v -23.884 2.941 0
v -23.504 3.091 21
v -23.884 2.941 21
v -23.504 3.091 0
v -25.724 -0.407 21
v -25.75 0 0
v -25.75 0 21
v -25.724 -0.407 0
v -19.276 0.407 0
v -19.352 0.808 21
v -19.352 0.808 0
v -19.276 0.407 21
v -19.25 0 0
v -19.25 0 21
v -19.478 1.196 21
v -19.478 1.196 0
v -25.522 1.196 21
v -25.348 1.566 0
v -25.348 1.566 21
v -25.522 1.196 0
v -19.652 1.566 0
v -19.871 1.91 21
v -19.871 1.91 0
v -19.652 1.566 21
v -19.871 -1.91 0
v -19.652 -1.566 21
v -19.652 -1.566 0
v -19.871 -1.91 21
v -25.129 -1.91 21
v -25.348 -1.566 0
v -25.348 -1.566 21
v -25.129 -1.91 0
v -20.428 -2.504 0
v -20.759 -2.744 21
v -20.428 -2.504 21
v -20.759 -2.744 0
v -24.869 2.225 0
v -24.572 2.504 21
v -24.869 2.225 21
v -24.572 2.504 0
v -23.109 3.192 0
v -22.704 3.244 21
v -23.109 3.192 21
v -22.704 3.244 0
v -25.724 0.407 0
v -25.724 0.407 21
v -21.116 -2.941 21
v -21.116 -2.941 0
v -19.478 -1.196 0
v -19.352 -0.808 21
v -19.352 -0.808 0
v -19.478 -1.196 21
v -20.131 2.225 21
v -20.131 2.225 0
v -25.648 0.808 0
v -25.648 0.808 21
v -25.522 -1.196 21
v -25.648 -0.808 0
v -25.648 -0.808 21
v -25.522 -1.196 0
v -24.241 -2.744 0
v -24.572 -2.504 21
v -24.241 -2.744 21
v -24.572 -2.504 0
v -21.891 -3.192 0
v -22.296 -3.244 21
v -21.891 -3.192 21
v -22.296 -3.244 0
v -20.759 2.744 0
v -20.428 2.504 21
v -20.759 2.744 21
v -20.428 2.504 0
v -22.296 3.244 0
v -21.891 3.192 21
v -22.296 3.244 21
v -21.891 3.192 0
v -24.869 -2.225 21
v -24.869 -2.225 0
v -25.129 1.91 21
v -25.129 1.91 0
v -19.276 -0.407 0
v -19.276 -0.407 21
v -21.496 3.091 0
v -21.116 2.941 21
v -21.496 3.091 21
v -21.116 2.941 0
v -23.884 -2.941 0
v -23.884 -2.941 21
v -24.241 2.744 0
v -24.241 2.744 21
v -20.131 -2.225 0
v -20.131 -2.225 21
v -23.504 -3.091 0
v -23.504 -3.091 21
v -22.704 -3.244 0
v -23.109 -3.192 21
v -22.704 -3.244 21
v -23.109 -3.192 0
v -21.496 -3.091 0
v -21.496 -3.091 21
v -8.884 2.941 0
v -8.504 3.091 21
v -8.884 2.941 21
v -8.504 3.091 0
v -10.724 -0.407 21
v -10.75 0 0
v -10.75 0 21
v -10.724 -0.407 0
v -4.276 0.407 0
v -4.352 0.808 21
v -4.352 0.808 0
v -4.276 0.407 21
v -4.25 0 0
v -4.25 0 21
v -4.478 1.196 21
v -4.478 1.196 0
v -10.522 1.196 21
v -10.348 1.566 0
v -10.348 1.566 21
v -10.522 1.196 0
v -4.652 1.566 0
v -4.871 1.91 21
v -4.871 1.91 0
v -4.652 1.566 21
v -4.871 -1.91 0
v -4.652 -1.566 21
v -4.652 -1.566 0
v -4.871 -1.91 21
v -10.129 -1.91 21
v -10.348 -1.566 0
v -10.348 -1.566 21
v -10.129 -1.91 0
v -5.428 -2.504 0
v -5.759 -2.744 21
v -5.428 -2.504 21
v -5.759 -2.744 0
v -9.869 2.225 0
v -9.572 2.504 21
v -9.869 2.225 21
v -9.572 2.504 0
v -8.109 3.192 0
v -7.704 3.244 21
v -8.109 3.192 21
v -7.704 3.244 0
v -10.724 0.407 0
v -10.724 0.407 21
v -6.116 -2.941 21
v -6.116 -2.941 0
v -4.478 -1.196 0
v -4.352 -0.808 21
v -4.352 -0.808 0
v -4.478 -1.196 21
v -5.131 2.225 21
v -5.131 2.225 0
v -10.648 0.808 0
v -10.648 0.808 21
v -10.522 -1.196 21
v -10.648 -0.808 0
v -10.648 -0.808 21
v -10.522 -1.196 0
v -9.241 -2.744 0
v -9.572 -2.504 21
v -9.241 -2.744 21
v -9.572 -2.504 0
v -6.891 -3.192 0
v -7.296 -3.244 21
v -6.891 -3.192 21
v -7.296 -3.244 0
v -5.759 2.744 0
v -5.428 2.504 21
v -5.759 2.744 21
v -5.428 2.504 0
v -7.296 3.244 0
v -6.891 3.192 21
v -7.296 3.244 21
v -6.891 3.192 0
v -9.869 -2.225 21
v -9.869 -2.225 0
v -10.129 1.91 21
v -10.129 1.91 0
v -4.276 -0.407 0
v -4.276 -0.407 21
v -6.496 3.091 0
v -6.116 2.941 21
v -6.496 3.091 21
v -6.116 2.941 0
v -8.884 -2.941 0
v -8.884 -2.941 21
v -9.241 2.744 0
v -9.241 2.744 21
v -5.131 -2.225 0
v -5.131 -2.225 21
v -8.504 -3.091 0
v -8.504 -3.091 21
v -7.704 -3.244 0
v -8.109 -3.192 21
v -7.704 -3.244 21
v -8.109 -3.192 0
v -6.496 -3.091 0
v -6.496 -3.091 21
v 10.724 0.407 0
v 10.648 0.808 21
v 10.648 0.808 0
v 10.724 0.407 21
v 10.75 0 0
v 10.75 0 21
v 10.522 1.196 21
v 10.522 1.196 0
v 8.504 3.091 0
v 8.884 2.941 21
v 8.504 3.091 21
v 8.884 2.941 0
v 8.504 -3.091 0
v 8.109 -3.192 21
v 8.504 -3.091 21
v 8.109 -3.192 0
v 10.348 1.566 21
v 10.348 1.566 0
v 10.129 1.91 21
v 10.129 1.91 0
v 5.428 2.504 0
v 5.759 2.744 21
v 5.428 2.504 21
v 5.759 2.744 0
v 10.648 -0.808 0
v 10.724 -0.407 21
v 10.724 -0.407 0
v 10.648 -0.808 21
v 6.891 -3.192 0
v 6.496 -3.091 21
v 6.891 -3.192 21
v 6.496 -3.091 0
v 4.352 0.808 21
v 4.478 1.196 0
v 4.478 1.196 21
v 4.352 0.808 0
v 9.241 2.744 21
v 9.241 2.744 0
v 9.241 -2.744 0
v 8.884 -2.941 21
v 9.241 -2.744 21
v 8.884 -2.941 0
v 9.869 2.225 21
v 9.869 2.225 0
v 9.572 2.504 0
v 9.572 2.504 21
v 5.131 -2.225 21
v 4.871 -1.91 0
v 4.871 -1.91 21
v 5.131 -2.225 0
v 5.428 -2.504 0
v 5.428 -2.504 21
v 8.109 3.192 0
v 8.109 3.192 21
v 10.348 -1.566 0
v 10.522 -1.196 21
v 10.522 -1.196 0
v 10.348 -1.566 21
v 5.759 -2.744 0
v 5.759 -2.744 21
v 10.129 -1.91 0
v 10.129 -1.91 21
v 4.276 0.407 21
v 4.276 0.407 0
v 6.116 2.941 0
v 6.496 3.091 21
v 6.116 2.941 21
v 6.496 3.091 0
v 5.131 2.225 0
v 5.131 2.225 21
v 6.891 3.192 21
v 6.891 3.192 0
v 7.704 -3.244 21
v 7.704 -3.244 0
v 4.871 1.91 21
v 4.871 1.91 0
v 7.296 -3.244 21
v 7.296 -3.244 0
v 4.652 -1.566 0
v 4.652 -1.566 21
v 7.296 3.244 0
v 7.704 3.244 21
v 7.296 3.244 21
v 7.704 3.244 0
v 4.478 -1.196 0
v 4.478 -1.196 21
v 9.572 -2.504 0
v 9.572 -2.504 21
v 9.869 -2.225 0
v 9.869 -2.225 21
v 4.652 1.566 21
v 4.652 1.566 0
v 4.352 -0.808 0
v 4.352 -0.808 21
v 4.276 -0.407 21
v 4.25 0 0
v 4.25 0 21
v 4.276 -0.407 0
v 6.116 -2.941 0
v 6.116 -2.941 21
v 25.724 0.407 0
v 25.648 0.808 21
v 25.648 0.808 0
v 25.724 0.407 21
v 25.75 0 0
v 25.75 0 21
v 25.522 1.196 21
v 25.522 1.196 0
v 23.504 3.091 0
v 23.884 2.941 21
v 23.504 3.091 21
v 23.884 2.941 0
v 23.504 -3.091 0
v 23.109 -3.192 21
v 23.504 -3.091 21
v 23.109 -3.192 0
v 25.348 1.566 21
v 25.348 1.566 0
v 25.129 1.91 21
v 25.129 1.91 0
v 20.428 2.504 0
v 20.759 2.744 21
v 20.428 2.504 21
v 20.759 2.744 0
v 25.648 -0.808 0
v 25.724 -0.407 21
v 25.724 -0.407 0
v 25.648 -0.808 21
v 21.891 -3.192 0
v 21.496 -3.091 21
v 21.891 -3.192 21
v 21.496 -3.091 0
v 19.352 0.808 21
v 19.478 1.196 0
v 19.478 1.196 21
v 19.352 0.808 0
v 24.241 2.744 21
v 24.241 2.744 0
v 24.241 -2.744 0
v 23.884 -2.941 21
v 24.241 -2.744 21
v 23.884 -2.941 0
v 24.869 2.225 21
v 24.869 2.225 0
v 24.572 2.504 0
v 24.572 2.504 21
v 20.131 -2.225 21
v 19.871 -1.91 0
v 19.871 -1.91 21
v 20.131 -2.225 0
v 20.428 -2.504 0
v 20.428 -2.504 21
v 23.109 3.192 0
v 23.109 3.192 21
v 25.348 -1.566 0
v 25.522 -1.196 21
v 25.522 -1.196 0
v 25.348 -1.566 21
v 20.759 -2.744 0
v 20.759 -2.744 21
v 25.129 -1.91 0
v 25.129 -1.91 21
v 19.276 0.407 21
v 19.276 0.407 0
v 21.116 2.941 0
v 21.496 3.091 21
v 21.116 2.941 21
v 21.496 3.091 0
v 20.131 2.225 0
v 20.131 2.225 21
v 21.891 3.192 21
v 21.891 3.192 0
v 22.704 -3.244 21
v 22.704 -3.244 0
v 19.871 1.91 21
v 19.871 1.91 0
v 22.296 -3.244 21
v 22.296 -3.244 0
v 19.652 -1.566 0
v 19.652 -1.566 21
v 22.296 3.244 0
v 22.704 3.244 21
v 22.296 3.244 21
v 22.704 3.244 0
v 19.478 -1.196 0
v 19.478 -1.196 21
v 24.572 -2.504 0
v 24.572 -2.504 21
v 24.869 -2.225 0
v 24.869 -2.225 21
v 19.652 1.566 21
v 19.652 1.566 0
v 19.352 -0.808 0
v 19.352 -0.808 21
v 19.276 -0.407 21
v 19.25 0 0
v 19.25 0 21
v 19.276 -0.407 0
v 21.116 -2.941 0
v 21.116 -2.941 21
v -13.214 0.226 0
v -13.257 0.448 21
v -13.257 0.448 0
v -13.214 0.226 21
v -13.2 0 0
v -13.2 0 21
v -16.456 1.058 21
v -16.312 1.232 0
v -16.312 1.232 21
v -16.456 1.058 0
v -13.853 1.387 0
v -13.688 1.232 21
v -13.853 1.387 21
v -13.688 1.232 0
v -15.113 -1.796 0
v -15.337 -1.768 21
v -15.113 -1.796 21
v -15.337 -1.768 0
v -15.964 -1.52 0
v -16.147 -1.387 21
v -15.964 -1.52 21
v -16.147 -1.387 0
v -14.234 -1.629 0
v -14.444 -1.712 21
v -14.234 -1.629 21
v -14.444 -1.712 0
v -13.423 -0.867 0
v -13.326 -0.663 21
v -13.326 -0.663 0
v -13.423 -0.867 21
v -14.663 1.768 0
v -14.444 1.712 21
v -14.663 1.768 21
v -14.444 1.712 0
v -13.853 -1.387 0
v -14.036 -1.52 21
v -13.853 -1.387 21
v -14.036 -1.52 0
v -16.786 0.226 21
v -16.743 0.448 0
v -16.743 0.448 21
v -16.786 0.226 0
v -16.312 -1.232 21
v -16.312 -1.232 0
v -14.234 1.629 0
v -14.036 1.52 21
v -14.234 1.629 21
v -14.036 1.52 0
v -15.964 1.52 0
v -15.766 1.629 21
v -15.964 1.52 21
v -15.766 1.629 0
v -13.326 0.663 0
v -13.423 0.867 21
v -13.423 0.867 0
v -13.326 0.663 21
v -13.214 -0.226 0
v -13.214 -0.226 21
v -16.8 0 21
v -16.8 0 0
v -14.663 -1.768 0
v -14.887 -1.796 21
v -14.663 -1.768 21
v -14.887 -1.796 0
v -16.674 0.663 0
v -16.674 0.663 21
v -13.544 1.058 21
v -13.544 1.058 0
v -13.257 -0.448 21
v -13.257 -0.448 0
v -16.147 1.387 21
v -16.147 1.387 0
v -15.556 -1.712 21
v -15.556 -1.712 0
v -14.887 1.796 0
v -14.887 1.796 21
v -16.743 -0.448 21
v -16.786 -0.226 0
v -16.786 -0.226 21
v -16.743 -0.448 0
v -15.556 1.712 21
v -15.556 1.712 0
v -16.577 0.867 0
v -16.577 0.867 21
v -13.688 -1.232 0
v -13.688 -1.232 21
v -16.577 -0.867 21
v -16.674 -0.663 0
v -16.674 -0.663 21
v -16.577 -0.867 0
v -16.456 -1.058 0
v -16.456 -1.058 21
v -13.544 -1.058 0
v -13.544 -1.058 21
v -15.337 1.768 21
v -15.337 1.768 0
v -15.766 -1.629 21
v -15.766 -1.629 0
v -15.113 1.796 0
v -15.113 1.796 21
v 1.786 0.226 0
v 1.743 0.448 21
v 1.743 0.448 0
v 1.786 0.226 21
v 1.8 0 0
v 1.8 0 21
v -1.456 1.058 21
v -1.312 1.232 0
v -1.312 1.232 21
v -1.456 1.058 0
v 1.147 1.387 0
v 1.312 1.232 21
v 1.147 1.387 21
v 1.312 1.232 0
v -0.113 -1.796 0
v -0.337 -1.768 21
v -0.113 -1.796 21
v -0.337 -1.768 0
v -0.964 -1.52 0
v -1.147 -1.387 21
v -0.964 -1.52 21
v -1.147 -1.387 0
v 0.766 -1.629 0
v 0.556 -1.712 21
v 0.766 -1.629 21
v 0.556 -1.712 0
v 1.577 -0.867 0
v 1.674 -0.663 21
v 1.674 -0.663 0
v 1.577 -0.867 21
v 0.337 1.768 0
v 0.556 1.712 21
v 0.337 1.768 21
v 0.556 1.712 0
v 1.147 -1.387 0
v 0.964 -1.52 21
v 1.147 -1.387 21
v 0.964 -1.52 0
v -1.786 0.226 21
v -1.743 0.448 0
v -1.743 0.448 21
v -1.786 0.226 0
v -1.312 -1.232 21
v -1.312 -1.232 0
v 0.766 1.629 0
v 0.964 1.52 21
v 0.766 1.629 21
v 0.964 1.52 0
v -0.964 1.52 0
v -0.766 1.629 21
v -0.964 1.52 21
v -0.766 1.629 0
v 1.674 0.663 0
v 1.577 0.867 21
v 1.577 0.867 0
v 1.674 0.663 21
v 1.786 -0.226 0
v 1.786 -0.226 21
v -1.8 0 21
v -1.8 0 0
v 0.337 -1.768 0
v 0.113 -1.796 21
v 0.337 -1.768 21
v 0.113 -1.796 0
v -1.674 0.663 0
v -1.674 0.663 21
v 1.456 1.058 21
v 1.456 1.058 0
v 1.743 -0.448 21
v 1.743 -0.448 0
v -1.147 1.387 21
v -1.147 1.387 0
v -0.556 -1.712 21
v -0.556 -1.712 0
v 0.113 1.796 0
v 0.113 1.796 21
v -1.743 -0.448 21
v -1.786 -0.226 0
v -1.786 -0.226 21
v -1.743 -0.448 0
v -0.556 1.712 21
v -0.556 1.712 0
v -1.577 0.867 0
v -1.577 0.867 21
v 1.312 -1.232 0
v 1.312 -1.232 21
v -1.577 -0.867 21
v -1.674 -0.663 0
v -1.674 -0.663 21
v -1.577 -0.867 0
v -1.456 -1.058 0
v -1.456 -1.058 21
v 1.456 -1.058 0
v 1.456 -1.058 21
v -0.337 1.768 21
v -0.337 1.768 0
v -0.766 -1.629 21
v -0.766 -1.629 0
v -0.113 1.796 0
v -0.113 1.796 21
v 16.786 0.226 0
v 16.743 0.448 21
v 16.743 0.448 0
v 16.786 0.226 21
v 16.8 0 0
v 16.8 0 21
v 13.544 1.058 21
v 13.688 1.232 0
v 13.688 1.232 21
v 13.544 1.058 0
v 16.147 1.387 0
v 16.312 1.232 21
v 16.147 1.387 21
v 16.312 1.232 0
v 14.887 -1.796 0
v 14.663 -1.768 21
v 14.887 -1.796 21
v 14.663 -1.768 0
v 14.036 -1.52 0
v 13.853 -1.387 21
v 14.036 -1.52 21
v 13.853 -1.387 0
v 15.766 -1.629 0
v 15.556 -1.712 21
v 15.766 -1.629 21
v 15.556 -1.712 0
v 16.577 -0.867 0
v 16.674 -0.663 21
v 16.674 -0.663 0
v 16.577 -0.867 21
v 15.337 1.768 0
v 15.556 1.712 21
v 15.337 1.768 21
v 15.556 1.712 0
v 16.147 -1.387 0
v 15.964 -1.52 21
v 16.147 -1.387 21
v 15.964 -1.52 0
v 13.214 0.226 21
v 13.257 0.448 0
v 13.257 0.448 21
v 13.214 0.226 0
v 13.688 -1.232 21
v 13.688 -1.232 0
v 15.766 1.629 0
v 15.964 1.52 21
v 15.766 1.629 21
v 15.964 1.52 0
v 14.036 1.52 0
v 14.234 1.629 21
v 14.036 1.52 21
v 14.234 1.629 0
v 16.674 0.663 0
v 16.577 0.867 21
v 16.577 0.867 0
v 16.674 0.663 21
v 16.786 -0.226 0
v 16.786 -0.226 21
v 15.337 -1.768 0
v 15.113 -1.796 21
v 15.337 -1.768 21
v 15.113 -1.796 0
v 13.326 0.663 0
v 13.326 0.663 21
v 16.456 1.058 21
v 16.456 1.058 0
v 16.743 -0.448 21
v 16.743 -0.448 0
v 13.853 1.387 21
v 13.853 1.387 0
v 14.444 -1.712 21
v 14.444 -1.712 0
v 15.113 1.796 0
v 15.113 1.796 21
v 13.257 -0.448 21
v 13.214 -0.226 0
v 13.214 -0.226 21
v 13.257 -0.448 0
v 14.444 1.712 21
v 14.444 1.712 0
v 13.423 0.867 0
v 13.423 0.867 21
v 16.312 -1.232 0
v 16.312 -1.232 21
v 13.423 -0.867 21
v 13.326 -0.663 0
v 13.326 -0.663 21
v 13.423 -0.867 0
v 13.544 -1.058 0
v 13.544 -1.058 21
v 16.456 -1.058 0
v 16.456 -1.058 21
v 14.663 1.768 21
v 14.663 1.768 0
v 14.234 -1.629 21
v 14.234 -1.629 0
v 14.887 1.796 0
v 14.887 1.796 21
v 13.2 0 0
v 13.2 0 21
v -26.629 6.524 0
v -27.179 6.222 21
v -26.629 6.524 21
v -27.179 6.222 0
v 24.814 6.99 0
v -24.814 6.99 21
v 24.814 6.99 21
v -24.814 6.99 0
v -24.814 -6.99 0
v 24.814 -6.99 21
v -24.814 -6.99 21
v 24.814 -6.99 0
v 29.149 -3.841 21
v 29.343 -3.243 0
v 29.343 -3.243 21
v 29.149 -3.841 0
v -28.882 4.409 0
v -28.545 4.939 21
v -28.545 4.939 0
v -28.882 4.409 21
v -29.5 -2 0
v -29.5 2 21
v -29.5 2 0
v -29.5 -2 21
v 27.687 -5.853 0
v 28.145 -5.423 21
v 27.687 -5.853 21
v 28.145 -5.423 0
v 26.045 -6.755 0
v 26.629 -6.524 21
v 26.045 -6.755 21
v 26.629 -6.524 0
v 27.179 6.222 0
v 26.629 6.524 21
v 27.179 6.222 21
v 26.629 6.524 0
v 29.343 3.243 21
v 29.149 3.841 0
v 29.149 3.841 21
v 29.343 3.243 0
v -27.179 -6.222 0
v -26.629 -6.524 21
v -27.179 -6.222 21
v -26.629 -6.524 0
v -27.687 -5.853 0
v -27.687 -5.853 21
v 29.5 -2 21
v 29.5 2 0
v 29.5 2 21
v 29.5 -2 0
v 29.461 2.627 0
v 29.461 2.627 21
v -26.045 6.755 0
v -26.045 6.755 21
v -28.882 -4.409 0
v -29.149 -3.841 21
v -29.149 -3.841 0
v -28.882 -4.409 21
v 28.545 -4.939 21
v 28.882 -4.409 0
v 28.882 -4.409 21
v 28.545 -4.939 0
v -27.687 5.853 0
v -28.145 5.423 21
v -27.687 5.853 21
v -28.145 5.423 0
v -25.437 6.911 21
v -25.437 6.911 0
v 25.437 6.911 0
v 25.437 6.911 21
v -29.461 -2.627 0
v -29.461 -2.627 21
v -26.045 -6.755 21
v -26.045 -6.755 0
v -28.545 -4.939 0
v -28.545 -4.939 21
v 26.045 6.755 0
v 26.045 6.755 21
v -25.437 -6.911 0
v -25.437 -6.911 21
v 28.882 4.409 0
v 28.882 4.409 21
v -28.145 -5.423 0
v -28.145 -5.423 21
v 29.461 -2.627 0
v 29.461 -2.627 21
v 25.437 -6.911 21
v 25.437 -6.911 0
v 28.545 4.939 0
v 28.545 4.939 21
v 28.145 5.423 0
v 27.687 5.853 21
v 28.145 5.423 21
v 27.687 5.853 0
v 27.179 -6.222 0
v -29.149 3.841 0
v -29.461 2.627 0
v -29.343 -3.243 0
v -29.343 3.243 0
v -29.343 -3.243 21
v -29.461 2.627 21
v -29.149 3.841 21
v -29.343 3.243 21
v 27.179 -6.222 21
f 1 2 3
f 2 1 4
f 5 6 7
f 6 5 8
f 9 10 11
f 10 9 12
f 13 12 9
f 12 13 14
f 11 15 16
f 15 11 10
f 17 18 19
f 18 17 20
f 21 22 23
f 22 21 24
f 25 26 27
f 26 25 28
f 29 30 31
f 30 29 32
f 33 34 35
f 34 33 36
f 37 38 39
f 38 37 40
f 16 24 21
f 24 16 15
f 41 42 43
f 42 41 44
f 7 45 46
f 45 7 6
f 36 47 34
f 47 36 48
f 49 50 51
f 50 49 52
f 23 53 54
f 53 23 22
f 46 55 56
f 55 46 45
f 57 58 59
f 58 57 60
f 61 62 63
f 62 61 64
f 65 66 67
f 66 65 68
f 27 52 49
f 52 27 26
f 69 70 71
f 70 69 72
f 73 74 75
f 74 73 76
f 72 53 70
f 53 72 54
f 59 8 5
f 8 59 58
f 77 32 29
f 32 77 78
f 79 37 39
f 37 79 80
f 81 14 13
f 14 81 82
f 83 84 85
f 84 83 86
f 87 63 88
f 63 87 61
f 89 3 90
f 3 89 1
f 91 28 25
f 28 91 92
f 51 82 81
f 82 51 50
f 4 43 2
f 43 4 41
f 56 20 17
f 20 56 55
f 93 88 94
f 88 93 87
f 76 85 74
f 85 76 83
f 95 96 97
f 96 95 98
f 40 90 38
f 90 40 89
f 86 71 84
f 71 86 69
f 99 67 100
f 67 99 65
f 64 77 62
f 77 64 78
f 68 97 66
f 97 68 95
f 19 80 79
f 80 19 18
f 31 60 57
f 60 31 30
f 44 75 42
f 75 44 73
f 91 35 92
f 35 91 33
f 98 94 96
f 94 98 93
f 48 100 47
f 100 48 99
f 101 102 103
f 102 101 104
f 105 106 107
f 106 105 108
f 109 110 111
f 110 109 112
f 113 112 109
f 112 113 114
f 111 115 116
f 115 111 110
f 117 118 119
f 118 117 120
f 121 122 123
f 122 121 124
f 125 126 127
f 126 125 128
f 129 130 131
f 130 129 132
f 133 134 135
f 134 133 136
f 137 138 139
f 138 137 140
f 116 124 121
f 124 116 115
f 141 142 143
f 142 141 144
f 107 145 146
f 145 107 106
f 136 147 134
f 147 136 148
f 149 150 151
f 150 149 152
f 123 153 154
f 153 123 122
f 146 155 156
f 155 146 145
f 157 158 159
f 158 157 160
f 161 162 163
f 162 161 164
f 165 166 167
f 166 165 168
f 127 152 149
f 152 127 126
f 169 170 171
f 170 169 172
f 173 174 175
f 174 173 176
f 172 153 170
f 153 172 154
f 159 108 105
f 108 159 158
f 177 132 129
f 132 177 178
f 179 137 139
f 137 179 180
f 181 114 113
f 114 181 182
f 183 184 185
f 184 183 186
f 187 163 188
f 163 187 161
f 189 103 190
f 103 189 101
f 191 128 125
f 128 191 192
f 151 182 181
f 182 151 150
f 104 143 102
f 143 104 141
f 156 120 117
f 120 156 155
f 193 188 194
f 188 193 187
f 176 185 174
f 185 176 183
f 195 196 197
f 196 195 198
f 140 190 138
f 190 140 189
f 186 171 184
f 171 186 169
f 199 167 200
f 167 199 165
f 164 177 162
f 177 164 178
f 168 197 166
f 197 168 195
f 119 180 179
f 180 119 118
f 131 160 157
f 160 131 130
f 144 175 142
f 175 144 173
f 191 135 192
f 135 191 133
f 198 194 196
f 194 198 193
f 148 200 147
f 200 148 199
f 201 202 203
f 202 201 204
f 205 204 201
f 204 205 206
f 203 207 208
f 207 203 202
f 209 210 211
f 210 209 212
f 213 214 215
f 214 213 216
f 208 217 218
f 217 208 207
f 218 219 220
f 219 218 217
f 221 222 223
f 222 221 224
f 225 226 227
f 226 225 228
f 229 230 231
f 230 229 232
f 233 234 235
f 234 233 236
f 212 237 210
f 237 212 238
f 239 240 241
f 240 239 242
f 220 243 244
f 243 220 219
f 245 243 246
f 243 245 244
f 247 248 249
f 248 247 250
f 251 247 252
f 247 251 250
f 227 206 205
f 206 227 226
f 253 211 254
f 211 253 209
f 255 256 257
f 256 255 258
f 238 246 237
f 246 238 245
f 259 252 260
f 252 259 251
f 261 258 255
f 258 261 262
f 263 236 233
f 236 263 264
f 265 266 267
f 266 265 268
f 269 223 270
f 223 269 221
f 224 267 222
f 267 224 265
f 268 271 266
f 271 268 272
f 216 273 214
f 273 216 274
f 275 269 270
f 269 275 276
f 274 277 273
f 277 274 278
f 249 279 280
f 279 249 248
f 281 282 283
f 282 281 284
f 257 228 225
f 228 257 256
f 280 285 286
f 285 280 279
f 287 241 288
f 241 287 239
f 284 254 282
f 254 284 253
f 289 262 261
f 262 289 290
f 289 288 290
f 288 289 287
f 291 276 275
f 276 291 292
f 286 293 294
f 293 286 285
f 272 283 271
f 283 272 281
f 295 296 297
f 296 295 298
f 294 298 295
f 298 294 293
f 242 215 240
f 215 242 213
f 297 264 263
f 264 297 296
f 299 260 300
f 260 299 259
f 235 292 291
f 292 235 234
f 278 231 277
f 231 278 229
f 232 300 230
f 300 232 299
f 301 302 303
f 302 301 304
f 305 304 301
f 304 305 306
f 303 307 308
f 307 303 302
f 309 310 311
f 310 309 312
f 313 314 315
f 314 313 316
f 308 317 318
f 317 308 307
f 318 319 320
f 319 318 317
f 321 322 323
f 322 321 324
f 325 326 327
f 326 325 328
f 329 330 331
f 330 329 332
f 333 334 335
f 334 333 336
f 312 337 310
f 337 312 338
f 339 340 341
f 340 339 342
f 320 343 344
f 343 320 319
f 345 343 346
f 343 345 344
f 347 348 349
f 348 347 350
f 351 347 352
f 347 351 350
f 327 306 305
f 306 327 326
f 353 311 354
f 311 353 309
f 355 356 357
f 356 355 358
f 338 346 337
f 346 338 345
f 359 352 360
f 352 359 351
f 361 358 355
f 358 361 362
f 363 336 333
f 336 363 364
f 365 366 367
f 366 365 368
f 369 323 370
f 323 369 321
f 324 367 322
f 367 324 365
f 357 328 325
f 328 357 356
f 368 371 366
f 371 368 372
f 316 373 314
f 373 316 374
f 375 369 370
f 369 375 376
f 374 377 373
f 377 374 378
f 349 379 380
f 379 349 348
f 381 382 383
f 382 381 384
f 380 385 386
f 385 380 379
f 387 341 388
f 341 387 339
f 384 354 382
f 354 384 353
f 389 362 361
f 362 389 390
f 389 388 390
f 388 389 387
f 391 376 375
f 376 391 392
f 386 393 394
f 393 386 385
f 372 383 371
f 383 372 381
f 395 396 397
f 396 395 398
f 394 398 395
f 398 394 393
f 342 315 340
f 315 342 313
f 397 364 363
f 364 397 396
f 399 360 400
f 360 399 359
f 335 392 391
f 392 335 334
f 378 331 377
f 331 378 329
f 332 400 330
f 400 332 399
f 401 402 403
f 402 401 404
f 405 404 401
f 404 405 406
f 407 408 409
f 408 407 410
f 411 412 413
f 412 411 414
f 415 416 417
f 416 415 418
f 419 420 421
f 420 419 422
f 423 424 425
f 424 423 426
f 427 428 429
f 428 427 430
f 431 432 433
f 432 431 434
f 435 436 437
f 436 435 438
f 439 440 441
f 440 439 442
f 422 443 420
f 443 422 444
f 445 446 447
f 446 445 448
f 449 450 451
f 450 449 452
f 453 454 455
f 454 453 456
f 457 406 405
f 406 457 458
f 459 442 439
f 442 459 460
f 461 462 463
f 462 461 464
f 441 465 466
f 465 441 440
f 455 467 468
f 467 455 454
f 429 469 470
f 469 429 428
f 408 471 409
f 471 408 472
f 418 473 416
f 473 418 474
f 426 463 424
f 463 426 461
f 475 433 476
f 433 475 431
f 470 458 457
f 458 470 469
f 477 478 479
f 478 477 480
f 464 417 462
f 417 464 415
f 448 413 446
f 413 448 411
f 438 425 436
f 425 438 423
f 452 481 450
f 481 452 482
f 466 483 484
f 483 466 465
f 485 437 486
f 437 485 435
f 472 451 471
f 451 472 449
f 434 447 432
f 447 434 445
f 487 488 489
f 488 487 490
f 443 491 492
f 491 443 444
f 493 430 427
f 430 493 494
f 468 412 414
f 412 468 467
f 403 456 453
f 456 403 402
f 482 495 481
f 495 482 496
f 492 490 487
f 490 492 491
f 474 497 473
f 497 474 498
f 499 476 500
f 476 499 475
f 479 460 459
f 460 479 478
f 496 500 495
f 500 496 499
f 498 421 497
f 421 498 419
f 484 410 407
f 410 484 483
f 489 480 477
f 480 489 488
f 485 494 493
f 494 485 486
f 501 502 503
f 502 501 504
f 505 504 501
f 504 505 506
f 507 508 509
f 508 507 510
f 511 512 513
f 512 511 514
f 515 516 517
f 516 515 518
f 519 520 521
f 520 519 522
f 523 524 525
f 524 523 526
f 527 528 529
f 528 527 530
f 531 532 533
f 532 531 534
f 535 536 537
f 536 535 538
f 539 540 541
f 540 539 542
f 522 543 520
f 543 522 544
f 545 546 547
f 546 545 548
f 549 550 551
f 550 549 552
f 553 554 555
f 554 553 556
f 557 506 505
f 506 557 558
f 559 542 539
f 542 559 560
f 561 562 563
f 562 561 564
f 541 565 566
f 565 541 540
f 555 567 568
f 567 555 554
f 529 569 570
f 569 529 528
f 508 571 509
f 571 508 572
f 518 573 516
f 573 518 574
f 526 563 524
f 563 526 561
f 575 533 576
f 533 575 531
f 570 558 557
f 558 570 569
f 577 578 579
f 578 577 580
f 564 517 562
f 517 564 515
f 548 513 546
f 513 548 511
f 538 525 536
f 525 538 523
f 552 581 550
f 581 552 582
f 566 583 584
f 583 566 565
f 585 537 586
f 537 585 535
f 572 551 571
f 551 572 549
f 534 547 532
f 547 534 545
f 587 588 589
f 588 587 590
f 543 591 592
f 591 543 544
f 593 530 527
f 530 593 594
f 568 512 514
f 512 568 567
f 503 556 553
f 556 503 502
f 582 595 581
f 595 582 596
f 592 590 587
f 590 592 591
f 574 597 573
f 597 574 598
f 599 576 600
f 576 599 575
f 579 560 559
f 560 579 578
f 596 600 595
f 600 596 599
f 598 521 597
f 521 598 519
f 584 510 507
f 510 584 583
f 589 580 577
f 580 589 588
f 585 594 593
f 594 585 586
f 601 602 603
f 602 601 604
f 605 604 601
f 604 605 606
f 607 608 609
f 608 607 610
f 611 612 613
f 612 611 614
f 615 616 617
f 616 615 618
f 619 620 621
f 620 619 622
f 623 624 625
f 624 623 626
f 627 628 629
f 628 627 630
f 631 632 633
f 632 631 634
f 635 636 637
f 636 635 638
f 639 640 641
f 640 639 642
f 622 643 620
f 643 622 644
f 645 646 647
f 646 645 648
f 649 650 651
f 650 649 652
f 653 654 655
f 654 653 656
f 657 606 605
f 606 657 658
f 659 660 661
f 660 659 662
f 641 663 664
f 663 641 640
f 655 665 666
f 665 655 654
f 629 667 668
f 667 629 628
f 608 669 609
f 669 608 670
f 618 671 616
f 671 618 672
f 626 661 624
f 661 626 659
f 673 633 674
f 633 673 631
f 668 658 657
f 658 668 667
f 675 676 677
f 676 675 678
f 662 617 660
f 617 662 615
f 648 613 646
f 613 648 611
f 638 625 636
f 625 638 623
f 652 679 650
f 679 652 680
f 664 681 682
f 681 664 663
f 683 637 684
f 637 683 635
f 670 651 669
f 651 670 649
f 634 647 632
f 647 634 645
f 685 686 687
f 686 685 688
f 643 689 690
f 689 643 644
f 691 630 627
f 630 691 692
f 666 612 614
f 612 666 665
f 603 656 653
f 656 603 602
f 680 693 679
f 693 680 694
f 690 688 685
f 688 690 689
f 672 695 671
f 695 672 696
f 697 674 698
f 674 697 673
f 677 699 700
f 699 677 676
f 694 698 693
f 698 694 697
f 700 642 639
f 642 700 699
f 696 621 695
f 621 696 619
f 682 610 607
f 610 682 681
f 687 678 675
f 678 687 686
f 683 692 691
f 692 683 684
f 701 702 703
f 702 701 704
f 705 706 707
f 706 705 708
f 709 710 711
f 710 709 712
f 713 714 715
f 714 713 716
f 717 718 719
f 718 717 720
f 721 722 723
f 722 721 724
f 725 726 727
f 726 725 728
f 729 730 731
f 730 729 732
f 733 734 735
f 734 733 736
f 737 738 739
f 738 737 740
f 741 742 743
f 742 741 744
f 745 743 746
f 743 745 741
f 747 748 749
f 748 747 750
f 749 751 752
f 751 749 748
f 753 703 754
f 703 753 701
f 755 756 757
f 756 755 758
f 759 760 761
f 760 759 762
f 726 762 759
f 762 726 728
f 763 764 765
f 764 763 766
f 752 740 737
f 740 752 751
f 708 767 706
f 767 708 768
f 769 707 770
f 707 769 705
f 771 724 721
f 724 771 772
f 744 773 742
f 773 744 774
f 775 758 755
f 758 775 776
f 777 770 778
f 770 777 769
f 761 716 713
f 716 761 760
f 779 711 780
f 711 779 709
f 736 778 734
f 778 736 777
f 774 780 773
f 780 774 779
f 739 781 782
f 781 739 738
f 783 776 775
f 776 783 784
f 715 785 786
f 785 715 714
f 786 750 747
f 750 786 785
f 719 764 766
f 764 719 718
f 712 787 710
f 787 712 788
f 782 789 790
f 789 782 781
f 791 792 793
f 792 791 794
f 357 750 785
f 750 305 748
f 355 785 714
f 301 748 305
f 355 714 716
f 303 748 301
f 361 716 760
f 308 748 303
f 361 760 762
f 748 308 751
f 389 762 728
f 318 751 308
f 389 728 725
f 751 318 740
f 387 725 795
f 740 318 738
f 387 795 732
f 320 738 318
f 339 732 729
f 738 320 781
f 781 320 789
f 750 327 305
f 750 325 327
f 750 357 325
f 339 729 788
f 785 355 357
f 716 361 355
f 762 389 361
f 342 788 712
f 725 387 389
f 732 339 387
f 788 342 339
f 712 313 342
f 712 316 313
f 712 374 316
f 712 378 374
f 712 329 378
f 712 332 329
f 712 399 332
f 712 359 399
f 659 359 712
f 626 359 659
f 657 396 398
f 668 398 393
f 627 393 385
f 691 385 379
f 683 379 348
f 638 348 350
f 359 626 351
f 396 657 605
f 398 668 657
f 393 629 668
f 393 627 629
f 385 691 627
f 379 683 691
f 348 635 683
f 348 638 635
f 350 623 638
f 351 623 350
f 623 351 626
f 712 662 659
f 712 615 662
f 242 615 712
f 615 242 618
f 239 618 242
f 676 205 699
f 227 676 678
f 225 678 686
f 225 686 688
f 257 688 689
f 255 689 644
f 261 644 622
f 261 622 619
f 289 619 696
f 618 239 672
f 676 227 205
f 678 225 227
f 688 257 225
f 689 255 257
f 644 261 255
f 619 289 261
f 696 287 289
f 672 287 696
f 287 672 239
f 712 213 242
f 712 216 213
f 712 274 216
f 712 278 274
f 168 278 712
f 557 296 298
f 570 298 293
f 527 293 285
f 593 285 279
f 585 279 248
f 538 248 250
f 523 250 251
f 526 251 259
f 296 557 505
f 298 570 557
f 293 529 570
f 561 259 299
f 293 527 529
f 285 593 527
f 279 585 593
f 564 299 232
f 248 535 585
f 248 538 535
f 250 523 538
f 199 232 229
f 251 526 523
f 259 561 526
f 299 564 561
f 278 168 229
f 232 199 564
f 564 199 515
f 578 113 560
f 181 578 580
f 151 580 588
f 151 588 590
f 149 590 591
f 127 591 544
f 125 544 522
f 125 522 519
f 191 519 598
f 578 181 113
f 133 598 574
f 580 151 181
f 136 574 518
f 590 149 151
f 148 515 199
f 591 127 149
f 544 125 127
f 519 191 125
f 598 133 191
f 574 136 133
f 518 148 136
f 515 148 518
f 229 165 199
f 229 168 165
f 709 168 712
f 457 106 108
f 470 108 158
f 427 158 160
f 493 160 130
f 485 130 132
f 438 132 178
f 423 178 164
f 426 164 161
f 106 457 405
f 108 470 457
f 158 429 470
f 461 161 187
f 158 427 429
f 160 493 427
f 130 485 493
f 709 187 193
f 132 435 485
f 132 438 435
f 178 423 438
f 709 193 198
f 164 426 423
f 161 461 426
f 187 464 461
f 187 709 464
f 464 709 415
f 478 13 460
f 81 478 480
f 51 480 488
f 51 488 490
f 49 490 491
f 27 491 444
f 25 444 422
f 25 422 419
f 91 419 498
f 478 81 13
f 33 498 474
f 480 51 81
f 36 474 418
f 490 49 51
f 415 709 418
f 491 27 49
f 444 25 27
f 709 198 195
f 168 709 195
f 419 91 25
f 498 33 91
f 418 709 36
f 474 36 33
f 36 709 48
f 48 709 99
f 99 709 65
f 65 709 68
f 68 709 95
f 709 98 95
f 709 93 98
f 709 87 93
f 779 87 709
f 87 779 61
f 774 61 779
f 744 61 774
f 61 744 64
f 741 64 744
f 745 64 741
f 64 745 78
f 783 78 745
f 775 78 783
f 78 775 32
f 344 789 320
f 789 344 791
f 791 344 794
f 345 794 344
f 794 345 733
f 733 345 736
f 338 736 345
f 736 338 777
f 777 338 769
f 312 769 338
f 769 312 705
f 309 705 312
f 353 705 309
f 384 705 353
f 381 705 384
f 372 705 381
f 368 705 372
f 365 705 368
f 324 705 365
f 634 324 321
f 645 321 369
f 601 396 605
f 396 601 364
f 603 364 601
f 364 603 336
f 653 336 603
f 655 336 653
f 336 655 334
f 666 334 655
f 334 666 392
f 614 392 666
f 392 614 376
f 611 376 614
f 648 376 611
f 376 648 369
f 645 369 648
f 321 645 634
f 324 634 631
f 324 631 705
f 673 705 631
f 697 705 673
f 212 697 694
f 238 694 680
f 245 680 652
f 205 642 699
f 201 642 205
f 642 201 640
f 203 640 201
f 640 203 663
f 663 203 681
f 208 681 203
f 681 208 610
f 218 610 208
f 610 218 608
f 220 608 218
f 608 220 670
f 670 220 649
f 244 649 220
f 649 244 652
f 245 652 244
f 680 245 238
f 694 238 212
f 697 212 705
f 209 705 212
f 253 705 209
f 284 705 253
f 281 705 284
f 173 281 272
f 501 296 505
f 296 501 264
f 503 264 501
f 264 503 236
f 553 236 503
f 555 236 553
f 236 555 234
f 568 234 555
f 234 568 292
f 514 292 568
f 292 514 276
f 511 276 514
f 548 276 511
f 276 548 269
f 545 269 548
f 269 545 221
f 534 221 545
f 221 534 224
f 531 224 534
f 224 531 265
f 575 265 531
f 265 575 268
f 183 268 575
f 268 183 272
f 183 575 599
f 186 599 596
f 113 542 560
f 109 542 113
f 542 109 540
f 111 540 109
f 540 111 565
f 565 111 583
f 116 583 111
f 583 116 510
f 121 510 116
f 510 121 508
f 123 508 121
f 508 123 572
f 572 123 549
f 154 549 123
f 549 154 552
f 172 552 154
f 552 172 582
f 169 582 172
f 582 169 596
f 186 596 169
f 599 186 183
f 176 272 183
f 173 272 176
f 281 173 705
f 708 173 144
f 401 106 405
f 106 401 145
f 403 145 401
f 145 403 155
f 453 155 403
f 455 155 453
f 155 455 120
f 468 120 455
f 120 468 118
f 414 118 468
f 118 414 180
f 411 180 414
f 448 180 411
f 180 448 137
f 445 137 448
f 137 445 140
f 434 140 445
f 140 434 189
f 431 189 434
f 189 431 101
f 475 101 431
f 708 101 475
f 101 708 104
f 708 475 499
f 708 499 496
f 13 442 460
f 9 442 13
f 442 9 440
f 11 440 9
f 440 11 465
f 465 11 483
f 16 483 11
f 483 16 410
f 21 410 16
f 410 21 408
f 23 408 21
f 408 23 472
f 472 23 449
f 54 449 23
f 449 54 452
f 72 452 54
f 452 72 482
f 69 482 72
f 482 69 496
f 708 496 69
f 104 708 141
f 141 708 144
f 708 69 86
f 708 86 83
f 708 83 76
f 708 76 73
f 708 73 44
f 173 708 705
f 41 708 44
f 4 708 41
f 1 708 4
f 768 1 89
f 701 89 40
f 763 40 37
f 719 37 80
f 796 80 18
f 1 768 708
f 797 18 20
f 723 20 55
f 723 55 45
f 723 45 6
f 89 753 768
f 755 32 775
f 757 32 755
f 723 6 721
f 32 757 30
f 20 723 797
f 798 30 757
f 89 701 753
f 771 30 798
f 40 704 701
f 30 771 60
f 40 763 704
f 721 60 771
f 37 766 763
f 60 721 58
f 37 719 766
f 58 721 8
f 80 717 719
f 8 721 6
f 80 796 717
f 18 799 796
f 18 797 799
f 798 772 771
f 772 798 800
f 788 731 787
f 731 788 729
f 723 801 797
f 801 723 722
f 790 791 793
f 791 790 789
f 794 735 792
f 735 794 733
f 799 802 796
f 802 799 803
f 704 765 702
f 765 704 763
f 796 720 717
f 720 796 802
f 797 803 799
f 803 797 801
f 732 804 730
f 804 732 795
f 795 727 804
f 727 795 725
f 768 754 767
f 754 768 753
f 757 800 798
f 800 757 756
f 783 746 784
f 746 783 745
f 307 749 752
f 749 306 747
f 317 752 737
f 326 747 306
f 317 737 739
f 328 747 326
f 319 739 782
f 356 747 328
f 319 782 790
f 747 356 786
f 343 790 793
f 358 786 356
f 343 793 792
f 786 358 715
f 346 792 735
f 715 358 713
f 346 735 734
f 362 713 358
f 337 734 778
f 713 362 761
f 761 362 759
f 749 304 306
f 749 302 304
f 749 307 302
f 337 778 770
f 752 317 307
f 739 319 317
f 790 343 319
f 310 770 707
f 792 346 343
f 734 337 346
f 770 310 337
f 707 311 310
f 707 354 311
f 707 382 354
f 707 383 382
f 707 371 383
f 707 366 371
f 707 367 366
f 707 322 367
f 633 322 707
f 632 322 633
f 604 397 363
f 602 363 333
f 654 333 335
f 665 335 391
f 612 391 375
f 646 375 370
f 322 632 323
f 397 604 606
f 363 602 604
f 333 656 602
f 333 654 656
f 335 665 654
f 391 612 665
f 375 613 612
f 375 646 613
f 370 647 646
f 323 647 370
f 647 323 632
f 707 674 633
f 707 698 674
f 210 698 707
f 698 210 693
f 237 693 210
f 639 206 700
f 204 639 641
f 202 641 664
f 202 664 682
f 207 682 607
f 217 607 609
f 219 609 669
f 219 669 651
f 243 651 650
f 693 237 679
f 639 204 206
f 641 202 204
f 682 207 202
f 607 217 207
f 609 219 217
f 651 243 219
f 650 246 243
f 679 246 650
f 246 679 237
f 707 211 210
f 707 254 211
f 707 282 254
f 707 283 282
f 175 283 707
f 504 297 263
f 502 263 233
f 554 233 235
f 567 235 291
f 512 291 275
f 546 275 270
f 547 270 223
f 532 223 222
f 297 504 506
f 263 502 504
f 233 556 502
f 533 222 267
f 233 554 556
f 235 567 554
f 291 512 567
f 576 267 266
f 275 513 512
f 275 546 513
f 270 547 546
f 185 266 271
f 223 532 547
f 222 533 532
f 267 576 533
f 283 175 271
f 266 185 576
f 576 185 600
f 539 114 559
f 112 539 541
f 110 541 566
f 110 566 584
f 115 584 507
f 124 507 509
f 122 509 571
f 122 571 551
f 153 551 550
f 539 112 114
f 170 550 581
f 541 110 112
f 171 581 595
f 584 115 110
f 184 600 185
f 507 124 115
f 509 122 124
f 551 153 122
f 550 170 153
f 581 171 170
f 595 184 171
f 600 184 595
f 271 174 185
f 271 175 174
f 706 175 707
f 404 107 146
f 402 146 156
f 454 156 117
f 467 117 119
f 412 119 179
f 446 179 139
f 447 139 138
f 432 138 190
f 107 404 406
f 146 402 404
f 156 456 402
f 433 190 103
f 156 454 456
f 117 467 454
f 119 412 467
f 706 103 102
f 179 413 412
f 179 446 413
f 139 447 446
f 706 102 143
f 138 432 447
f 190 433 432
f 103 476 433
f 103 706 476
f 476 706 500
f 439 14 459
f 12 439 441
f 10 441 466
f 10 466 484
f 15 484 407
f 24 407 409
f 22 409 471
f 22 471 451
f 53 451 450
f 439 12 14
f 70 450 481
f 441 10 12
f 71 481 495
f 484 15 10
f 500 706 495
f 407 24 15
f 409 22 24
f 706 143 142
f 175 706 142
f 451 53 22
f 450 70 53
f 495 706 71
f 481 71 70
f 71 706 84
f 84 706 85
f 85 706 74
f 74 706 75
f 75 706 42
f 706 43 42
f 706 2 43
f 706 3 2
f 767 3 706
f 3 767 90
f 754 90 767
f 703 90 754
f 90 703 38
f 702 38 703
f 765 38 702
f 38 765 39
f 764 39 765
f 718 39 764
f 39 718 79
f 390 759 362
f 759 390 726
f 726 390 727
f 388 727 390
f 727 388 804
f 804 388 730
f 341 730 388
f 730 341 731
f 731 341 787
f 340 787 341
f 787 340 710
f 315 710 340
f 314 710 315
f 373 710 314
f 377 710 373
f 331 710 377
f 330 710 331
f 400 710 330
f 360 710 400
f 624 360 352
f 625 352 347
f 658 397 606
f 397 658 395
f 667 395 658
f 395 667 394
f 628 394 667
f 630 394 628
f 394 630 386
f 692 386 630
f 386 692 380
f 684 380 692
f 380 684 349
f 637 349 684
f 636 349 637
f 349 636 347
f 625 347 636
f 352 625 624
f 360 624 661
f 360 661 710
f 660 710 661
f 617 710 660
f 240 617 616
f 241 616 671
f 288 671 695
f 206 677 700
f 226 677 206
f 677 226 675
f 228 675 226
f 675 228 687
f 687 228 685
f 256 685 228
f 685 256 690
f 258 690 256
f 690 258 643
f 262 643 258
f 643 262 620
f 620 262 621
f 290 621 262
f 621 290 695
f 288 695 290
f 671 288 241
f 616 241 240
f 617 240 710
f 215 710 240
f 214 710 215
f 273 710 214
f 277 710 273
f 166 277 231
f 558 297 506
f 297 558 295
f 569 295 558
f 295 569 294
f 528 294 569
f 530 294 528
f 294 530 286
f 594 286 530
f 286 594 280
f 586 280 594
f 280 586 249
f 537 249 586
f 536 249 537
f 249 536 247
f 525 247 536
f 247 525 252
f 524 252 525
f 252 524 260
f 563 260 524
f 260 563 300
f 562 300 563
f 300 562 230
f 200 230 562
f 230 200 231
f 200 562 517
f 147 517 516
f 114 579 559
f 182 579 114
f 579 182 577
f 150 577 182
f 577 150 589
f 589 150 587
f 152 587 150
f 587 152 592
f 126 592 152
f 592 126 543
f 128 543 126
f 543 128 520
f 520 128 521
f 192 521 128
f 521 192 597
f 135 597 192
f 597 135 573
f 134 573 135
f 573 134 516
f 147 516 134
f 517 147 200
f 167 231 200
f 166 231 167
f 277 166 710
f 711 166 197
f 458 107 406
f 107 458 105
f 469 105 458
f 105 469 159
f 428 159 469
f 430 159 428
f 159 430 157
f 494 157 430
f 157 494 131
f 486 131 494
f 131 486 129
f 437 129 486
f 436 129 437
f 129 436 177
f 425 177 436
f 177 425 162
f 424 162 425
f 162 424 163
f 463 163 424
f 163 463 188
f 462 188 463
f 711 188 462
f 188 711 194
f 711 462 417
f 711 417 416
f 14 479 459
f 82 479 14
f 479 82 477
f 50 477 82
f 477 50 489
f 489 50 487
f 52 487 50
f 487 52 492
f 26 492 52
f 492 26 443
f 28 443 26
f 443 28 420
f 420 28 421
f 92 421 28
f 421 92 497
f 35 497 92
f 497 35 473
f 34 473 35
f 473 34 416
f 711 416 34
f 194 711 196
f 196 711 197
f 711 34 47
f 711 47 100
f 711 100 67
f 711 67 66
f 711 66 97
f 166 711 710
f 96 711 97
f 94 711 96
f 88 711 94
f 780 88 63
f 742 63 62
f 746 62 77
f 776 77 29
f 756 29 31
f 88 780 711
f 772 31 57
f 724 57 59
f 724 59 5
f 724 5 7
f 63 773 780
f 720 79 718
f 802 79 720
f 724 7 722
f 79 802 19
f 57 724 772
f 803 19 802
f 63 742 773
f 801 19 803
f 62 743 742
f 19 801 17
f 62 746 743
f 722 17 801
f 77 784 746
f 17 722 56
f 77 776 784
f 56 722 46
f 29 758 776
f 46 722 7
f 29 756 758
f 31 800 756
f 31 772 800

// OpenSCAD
$fn = 50;


difference() {
	union() {
		*color(alpha = 1.0000000000, c = "gray") {
			translate(v = [0, 7, 0]) {
				linear_extrude(height = 1) {
					text(font = "Arial:style=Bold", halign = "center", size = 4.5000000000, text = "COMMENT plate main", valign = "center");
				}
			}
		}
		hull() {
			translate(v = [-24.5000000000, 2.0000000000, 0]) {
				cylinder(h = 21, r = 5);
			}
			translate(v = [24.5000000000, 2.0000000000, 0]) {
				cylinder(h = 21, r = 5);
			}
			translate(v = [-24.5000000000, -2.0000000000, 0]) {
				cylinder(h = 21, r = 5);
			}
			translate(v = [24.5000000000, -2.0000000000, 0]) {
				cylinder(h = 21, r = 5);
			}
		}
	}
	union() {
		*color(alpha = 1.0000000000, c = "gray") {
			translate(v = [0, 7, 0]) {
				linear_extrude(height = 1) {
					text(font = "Arial:style=Bold", halign = "center", size = 4.5000000000, text = "COMMENT holes main", valign = "center");
				}
			}
		}
		translate(v = [-22.5000000000, 0.0000000000, 0]) {
			translate(v = [0, 0, -100]) {
				cylinder(h = 200, r = 3.2500000000);
			}
		}
		translate(v = [-7.5000000000, 0.0000000000, 0]) {
			translate(v = [0, 0, -100]) {
				cylinder(h = 200, r = 3.2500000000);
			}
		}
		translate(v = [7.5000000000, 0.0000000000, 0]) {
			translate(v = [0, 0, -100]) {
				cylinder(h = 200, r = 3.2500000000);
			}
		}
		translate(v = [22.5000000000, 0.0000000000, 0]) {
			translate(v = [0, 0, -100]) {
				cylinder(h = 200, r = 3.2500000000);
			}
		}
		translate(v = [-22.5000000000, 0.0000000000, 0]) {
			translate(v = [0, 0, -100]) {
				cylinder(h = 200, r = 1.8000000000);
			}
		}
		translate(v = [-15.0000000000, 0.0000000000, 0]) {
			translate(v = [0, 0, -100]) {
				cylinder(h = 200, r = 1.8000000000);
			}
		}
		translate(v = [-7.5000000000, 0.0000000000, 0]) {
			translate(v = [0, 0, -100]) {
				cylinder(h = 200, r = 1.8000000000);
			}
		}
		translate(v = [0, 0, -100]) {
			cylinder(h = 200, r = 1.8000000000);
		}
		translate(v = [7.5000000000, 0.0000000000, 0]) {
			translate(v = [0, 0, -100]) {
				cylinder(h = 200, r = 1.8000000000);
			}
		}
		translate(v = [15.0000000000, 0.0000000000, 0]) {
			translate(v = [0, 0, -100]) {
				cylinder(h = 200, r = 1.8000000000);
			}
		}
		translate(v = [22.5000000000, 0.0000000000, 0]) {
			translate(v = [0, 0, -100]) {
				cylinder(h = 200, r = 1.8000000000);
			}
		}
	}
}
